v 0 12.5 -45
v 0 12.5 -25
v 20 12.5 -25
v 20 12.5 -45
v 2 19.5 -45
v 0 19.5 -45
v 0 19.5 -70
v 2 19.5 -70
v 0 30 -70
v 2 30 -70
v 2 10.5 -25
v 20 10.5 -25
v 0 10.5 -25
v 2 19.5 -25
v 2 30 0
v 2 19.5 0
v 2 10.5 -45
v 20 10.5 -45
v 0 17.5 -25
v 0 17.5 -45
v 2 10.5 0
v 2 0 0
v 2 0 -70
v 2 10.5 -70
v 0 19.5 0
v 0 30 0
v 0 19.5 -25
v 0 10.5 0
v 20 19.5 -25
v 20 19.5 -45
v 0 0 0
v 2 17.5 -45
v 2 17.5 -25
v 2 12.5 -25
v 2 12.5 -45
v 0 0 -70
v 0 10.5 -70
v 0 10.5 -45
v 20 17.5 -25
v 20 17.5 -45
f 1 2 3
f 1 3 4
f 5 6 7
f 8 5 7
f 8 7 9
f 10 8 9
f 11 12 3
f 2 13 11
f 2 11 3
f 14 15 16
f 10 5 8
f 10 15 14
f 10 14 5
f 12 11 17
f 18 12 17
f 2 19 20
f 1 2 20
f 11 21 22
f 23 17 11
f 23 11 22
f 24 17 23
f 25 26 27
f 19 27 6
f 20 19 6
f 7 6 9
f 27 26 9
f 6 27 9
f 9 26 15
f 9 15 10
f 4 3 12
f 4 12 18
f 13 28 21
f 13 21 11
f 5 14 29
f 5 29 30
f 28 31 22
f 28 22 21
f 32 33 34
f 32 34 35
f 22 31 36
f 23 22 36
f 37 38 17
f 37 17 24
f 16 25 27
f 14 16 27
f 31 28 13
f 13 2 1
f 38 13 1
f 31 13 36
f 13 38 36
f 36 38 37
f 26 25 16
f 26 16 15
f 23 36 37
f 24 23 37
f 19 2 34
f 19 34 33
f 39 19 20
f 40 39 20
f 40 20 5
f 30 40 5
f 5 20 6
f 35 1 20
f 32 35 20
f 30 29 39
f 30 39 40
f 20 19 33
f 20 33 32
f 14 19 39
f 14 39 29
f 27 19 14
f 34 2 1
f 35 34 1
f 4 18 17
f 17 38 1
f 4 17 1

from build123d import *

# Parameters (mm, degrees)
SKETCH1_W             = 70
SKETCH1_H             = 10.5
BOSS_EXTRUDE1_DEPTH   = 2
SKETCH1_W_2           = 20
SKETCH1_H_2           = 5
BOSS_EXTRUDE1_2_DEPTH = 2
BOSS_EXTRUDE1_3_DEPTH = 2
SKETCH1_4_W           = 20
SKETCH1_4_H           = 2
BOSS_EXTRUDE2_DEPTH   = 20


with BuildPart() as part:
    # Sketch1 → Boss-Extrude1 (new body)
    with BuildSketch(Plane(origin=(0, 0, 0), x_dir=(0, 0, -1), z_dir=(1, 0, 0))):
        with Locations((35, 24.75)):
            Rectangle(SKETCH1_W, SKETCH1_H)
    extrude(amount=BOSS_EXTRUDE1_DEPTH)



with BuildPart() as body_2:
    # Sketch1 → Boss-Extrude1 2 (new body)
    with BuildSketch(Plane(origin=(0, 0, 0), x_dir=(0, 0, -1), z_dir=(1, 0, 0))):
        with Locations((35, 15)):
            Rectangle(SKETCH1_W_2, SKETCH1_H_2)
    extrude(amount=BOSS_EXTRUDE1_2_DEPTH)


with BuildPart() as body_3:
    # Sketch1 → Boss-Extrude1 3 (new body)
    with BuildSketch(Plane(origin=(0, 0, 0), x_dir=(0, 0, -1), z_dir=(1, 0, 0))):
        with Locations((35, 5.25)):
            Rectangle(SKETCH1_W, SKETCH1_H)
    extrude(amount=BOSS_EXTRUDE1_3_DEPTH)


with BuildPart() as part_1:
    add(part.part)

    add(body_3.part)  # Boss-Extrude2 merges body 3
    # Sketch1<4> → Boss-Extrude2 (add)
    with BuildSketch(Plane(origin=(0, 0, 0), x_dir=(0, 0, -1), z_dir=(1, 0, 0))):
        with Locations((35, 18.5)):
            Rectangle(SKETCH1_4_W, SKETCH1_4_H)
        with Locations((35, 11.5)):
            Rectangle(SKETCH1_4_W, SKETCH1_4_H)
    extrude(amount=BOSS_EXTRUDE2_DEPTH)


solid = Compound([body_2.part, part_1.part])
